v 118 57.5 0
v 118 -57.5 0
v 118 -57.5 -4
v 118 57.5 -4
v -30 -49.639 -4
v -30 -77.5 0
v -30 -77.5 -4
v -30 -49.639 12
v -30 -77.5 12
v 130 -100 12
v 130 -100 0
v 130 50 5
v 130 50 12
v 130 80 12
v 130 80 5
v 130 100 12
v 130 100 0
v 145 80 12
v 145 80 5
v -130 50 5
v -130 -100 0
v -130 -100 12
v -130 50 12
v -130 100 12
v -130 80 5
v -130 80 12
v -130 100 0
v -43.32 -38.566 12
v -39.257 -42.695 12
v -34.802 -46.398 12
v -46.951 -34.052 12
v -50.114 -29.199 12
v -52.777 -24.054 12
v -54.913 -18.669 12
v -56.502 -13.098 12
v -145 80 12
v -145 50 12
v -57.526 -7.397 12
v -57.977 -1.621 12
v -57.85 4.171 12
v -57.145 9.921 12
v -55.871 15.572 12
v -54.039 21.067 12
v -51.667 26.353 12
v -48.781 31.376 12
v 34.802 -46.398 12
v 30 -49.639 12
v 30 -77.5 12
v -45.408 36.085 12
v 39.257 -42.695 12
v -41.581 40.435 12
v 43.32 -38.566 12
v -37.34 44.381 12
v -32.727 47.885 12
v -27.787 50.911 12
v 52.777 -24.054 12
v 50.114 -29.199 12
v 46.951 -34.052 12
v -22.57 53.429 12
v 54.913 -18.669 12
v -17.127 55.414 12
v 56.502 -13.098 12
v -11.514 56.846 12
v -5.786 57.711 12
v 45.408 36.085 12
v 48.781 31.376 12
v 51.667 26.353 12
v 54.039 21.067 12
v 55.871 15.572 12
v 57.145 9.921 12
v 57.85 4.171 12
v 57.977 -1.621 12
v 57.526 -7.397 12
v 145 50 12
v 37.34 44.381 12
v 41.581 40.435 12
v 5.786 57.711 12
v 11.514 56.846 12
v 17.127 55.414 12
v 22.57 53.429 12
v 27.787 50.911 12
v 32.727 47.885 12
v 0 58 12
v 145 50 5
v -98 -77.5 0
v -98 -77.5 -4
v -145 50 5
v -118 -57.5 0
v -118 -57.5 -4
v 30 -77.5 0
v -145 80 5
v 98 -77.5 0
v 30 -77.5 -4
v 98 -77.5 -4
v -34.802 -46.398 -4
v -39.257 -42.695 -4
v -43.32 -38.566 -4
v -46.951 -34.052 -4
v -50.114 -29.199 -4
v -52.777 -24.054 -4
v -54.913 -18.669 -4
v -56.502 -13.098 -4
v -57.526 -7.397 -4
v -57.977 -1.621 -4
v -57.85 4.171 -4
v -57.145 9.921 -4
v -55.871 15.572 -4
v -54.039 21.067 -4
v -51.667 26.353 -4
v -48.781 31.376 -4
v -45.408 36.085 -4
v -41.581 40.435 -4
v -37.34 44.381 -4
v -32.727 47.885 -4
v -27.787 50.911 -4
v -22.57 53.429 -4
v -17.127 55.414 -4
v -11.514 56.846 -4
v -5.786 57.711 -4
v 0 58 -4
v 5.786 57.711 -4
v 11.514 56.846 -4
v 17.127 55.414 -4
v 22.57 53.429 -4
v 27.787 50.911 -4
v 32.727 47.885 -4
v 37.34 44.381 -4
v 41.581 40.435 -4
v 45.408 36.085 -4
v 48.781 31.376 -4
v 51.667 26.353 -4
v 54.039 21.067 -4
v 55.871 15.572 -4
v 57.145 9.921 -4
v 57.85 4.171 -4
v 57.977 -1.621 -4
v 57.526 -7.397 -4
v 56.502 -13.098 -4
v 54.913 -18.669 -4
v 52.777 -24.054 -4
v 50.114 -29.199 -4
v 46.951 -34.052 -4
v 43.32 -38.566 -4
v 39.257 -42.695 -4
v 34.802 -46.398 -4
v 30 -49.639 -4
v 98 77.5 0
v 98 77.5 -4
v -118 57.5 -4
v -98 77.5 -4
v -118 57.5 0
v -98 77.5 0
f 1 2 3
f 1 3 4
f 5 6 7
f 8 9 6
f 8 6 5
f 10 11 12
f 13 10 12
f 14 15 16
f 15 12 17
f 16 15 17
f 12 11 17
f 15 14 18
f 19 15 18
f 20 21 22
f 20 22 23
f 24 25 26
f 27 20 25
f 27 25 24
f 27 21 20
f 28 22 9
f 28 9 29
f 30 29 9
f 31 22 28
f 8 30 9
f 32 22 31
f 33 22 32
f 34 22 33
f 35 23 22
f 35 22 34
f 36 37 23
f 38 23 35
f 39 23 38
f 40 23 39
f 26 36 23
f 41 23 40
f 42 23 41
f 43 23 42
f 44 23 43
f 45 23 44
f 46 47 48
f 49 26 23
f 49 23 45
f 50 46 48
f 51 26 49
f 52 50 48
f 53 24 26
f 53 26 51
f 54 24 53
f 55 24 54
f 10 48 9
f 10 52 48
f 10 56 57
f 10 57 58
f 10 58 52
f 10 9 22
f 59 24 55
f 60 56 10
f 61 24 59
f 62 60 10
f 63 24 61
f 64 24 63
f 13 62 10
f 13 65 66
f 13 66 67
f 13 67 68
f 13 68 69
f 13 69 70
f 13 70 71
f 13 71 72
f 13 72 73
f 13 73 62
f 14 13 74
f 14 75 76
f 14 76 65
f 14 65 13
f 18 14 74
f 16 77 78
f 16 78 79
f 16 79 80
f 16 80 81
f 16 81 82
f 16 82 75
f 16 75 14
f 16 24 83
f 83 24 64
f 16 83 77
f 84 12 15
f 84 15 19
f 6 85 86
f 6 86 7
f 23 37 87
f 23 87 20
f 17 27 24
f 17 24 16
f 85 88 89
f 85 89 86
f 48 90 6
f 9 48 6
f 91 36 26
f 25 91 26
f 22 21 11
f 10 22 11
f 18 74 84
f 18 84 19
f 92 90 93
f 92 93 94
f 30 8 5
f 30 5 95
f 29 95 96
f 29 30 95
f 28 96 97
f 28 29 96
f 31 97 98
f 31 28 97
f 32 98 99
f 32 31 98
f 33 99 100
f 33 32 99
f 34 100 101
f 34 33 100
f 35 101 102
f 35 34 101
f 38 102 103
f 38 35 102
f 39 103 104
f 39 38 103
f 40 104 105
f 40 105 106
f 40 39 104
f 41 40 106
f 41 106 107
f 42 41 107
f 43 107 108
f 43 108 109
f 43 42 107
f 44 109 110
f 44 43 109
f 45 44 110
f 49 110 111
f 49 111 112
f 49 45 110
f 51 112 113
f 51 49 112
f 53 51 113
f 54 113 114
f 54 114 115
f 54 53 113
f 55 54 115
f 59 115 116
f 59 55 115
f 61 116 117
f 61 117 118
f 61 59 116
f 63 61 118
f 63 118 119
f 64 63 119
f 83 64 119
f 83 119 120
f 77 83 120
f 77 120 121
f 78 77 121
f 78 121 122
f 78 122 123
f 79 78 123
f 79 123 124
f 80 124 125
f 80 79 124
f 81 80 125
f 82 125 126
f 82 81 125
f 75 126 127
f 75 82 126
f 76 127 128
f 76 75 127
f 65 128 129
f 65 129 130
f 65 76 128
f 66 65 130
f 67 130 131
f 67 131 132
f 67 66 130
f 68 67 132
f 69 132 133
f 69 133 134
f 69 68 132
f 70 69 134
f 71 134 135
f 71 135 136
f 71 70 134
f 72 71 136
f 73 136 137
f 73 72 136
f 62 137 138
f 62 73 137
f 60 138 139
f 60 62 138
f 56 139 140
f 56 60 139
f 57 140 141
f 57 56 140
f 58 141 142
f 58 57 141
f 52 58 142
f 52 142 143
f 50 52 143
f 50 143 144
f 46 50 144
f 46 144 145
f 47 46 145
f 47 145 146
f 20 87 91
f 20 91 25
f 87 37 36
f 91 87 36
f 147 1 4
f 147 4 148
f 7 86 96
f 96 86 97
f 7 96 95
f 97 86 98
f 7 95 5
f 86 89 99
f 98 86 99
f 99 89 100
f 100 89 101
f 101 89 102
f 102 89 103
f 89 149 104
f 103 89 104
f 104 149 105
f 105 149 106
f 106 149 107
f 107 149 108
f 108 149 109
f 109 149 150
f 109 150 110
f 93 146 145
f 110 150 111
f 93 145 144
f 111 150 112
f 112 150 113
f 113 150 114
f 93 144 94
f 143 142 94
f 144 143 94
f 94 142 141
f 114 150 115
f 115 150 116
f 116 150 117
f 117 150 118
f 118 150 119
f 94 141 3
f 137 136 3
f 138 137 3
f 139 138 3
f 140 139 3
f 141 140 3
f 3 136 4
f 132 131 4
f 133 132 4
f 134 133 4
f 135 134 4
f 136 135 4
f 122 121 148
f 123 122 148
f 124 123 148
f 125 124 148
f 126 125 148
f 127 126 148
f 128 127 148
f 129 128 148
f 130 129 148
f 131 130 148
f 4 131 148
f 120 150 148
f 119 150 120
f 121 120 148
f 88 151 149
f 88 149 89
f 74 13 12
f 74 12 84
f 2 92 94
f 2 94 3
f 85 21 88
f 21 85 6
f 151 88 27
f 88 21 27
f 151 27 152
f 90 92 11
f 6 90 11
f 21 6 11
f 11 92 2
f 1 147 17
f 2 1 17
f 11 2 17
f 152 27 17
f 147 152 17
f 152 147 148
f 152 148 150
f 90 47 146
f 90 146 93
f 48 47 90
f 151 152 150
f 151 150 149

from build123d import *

# Parameters (mm, degrees)
F0_W     = 260
F0_H     = 200
F1_DEPTH = 12
F2_DEPTH = 4
F3_W     = 15
F3_H     = 30
F4_DEPTH = 7


with BuildPart() as f1:
    # F0 (on Top) → F1 (new body)
    with BuildSketch(Plane.XY):
        Rectangle(F0_W, F0_H)
        Polygon((-98, 77.5), (98, 77.5), (118, 57.5), (118, -57.5), (98, -77.5), (30, -77.5), (-30, -77.5), (-98, -77.5), (-118, -57.5), (-118, 57.5), align=None, mode=Mode.SUBTRACT)
        with BuildLine():
            Line((118, 57.5), (98, 77.5))
            Line((98, 77.5), (-98, 77.5))
            Line((-98, 77.5), (-118, 57.5))
            Line((-118, 57.5), (-118, -57.5))
            Line((-118, -57.5), (-98, -77.5))
            Line((-98, -77.5), (-30, -77.5))
            Line((-30, -77.5), (-30, -49.638695))
            ThreePointArc((-30, -49.638695), (0, 58), (30, -49.638695))
            Line((30, -49.638695), (30, -77.5))
            Line((30, -77.5), (98, -77.5))
            Line((98, -77.5), (118, -57.5))
            Line((118, -57.5), (118, 57.5))
        make_face()
    extrude(amount=F1_DEPTH)

    # F0 (on Top) → F2 (join)
    with BuildSketch(Plane.XY):
        with BuildLine():
            Line((118, 57.5), (98, 77.5))
            Line((98, 77.5), (-98, 77.5))
            Line((-98, 77.5), (-118, 57.5))
            Line((-118, 57.5), (-118, -57.5))
            Line((-118, -57.5), (-98, -77.5))
            Line((-98, -77.5), (-30, -77.5))
            Line((-30, -77.5), (-30, -49.638695))
            ThreePointArc((-30, -49.638695), (0, 58), (30, -49.638695))
            Line((30, -49.638695), (30, -77.5))
            Line((30, -77.5), (98, -77.5))
            Line((98, -77.5), (118, -57.5))
            Line((118, -57.5), (118, 57.5))
        make_face()
    extrude(amount=-F2_DEPTH)

    # F3 (on face) → F4 (join)
    with BuildSketch(Plane.XY.offset(12)):
        with Locations((-137.5, 65)):
            Rectangle(F3_W, F3_H)
        with Locations((137.5, 65)):
            Rectangle(F3_W, F3_H)
    extrude(amount=-F4_DEPTH)


solid = f1.part
